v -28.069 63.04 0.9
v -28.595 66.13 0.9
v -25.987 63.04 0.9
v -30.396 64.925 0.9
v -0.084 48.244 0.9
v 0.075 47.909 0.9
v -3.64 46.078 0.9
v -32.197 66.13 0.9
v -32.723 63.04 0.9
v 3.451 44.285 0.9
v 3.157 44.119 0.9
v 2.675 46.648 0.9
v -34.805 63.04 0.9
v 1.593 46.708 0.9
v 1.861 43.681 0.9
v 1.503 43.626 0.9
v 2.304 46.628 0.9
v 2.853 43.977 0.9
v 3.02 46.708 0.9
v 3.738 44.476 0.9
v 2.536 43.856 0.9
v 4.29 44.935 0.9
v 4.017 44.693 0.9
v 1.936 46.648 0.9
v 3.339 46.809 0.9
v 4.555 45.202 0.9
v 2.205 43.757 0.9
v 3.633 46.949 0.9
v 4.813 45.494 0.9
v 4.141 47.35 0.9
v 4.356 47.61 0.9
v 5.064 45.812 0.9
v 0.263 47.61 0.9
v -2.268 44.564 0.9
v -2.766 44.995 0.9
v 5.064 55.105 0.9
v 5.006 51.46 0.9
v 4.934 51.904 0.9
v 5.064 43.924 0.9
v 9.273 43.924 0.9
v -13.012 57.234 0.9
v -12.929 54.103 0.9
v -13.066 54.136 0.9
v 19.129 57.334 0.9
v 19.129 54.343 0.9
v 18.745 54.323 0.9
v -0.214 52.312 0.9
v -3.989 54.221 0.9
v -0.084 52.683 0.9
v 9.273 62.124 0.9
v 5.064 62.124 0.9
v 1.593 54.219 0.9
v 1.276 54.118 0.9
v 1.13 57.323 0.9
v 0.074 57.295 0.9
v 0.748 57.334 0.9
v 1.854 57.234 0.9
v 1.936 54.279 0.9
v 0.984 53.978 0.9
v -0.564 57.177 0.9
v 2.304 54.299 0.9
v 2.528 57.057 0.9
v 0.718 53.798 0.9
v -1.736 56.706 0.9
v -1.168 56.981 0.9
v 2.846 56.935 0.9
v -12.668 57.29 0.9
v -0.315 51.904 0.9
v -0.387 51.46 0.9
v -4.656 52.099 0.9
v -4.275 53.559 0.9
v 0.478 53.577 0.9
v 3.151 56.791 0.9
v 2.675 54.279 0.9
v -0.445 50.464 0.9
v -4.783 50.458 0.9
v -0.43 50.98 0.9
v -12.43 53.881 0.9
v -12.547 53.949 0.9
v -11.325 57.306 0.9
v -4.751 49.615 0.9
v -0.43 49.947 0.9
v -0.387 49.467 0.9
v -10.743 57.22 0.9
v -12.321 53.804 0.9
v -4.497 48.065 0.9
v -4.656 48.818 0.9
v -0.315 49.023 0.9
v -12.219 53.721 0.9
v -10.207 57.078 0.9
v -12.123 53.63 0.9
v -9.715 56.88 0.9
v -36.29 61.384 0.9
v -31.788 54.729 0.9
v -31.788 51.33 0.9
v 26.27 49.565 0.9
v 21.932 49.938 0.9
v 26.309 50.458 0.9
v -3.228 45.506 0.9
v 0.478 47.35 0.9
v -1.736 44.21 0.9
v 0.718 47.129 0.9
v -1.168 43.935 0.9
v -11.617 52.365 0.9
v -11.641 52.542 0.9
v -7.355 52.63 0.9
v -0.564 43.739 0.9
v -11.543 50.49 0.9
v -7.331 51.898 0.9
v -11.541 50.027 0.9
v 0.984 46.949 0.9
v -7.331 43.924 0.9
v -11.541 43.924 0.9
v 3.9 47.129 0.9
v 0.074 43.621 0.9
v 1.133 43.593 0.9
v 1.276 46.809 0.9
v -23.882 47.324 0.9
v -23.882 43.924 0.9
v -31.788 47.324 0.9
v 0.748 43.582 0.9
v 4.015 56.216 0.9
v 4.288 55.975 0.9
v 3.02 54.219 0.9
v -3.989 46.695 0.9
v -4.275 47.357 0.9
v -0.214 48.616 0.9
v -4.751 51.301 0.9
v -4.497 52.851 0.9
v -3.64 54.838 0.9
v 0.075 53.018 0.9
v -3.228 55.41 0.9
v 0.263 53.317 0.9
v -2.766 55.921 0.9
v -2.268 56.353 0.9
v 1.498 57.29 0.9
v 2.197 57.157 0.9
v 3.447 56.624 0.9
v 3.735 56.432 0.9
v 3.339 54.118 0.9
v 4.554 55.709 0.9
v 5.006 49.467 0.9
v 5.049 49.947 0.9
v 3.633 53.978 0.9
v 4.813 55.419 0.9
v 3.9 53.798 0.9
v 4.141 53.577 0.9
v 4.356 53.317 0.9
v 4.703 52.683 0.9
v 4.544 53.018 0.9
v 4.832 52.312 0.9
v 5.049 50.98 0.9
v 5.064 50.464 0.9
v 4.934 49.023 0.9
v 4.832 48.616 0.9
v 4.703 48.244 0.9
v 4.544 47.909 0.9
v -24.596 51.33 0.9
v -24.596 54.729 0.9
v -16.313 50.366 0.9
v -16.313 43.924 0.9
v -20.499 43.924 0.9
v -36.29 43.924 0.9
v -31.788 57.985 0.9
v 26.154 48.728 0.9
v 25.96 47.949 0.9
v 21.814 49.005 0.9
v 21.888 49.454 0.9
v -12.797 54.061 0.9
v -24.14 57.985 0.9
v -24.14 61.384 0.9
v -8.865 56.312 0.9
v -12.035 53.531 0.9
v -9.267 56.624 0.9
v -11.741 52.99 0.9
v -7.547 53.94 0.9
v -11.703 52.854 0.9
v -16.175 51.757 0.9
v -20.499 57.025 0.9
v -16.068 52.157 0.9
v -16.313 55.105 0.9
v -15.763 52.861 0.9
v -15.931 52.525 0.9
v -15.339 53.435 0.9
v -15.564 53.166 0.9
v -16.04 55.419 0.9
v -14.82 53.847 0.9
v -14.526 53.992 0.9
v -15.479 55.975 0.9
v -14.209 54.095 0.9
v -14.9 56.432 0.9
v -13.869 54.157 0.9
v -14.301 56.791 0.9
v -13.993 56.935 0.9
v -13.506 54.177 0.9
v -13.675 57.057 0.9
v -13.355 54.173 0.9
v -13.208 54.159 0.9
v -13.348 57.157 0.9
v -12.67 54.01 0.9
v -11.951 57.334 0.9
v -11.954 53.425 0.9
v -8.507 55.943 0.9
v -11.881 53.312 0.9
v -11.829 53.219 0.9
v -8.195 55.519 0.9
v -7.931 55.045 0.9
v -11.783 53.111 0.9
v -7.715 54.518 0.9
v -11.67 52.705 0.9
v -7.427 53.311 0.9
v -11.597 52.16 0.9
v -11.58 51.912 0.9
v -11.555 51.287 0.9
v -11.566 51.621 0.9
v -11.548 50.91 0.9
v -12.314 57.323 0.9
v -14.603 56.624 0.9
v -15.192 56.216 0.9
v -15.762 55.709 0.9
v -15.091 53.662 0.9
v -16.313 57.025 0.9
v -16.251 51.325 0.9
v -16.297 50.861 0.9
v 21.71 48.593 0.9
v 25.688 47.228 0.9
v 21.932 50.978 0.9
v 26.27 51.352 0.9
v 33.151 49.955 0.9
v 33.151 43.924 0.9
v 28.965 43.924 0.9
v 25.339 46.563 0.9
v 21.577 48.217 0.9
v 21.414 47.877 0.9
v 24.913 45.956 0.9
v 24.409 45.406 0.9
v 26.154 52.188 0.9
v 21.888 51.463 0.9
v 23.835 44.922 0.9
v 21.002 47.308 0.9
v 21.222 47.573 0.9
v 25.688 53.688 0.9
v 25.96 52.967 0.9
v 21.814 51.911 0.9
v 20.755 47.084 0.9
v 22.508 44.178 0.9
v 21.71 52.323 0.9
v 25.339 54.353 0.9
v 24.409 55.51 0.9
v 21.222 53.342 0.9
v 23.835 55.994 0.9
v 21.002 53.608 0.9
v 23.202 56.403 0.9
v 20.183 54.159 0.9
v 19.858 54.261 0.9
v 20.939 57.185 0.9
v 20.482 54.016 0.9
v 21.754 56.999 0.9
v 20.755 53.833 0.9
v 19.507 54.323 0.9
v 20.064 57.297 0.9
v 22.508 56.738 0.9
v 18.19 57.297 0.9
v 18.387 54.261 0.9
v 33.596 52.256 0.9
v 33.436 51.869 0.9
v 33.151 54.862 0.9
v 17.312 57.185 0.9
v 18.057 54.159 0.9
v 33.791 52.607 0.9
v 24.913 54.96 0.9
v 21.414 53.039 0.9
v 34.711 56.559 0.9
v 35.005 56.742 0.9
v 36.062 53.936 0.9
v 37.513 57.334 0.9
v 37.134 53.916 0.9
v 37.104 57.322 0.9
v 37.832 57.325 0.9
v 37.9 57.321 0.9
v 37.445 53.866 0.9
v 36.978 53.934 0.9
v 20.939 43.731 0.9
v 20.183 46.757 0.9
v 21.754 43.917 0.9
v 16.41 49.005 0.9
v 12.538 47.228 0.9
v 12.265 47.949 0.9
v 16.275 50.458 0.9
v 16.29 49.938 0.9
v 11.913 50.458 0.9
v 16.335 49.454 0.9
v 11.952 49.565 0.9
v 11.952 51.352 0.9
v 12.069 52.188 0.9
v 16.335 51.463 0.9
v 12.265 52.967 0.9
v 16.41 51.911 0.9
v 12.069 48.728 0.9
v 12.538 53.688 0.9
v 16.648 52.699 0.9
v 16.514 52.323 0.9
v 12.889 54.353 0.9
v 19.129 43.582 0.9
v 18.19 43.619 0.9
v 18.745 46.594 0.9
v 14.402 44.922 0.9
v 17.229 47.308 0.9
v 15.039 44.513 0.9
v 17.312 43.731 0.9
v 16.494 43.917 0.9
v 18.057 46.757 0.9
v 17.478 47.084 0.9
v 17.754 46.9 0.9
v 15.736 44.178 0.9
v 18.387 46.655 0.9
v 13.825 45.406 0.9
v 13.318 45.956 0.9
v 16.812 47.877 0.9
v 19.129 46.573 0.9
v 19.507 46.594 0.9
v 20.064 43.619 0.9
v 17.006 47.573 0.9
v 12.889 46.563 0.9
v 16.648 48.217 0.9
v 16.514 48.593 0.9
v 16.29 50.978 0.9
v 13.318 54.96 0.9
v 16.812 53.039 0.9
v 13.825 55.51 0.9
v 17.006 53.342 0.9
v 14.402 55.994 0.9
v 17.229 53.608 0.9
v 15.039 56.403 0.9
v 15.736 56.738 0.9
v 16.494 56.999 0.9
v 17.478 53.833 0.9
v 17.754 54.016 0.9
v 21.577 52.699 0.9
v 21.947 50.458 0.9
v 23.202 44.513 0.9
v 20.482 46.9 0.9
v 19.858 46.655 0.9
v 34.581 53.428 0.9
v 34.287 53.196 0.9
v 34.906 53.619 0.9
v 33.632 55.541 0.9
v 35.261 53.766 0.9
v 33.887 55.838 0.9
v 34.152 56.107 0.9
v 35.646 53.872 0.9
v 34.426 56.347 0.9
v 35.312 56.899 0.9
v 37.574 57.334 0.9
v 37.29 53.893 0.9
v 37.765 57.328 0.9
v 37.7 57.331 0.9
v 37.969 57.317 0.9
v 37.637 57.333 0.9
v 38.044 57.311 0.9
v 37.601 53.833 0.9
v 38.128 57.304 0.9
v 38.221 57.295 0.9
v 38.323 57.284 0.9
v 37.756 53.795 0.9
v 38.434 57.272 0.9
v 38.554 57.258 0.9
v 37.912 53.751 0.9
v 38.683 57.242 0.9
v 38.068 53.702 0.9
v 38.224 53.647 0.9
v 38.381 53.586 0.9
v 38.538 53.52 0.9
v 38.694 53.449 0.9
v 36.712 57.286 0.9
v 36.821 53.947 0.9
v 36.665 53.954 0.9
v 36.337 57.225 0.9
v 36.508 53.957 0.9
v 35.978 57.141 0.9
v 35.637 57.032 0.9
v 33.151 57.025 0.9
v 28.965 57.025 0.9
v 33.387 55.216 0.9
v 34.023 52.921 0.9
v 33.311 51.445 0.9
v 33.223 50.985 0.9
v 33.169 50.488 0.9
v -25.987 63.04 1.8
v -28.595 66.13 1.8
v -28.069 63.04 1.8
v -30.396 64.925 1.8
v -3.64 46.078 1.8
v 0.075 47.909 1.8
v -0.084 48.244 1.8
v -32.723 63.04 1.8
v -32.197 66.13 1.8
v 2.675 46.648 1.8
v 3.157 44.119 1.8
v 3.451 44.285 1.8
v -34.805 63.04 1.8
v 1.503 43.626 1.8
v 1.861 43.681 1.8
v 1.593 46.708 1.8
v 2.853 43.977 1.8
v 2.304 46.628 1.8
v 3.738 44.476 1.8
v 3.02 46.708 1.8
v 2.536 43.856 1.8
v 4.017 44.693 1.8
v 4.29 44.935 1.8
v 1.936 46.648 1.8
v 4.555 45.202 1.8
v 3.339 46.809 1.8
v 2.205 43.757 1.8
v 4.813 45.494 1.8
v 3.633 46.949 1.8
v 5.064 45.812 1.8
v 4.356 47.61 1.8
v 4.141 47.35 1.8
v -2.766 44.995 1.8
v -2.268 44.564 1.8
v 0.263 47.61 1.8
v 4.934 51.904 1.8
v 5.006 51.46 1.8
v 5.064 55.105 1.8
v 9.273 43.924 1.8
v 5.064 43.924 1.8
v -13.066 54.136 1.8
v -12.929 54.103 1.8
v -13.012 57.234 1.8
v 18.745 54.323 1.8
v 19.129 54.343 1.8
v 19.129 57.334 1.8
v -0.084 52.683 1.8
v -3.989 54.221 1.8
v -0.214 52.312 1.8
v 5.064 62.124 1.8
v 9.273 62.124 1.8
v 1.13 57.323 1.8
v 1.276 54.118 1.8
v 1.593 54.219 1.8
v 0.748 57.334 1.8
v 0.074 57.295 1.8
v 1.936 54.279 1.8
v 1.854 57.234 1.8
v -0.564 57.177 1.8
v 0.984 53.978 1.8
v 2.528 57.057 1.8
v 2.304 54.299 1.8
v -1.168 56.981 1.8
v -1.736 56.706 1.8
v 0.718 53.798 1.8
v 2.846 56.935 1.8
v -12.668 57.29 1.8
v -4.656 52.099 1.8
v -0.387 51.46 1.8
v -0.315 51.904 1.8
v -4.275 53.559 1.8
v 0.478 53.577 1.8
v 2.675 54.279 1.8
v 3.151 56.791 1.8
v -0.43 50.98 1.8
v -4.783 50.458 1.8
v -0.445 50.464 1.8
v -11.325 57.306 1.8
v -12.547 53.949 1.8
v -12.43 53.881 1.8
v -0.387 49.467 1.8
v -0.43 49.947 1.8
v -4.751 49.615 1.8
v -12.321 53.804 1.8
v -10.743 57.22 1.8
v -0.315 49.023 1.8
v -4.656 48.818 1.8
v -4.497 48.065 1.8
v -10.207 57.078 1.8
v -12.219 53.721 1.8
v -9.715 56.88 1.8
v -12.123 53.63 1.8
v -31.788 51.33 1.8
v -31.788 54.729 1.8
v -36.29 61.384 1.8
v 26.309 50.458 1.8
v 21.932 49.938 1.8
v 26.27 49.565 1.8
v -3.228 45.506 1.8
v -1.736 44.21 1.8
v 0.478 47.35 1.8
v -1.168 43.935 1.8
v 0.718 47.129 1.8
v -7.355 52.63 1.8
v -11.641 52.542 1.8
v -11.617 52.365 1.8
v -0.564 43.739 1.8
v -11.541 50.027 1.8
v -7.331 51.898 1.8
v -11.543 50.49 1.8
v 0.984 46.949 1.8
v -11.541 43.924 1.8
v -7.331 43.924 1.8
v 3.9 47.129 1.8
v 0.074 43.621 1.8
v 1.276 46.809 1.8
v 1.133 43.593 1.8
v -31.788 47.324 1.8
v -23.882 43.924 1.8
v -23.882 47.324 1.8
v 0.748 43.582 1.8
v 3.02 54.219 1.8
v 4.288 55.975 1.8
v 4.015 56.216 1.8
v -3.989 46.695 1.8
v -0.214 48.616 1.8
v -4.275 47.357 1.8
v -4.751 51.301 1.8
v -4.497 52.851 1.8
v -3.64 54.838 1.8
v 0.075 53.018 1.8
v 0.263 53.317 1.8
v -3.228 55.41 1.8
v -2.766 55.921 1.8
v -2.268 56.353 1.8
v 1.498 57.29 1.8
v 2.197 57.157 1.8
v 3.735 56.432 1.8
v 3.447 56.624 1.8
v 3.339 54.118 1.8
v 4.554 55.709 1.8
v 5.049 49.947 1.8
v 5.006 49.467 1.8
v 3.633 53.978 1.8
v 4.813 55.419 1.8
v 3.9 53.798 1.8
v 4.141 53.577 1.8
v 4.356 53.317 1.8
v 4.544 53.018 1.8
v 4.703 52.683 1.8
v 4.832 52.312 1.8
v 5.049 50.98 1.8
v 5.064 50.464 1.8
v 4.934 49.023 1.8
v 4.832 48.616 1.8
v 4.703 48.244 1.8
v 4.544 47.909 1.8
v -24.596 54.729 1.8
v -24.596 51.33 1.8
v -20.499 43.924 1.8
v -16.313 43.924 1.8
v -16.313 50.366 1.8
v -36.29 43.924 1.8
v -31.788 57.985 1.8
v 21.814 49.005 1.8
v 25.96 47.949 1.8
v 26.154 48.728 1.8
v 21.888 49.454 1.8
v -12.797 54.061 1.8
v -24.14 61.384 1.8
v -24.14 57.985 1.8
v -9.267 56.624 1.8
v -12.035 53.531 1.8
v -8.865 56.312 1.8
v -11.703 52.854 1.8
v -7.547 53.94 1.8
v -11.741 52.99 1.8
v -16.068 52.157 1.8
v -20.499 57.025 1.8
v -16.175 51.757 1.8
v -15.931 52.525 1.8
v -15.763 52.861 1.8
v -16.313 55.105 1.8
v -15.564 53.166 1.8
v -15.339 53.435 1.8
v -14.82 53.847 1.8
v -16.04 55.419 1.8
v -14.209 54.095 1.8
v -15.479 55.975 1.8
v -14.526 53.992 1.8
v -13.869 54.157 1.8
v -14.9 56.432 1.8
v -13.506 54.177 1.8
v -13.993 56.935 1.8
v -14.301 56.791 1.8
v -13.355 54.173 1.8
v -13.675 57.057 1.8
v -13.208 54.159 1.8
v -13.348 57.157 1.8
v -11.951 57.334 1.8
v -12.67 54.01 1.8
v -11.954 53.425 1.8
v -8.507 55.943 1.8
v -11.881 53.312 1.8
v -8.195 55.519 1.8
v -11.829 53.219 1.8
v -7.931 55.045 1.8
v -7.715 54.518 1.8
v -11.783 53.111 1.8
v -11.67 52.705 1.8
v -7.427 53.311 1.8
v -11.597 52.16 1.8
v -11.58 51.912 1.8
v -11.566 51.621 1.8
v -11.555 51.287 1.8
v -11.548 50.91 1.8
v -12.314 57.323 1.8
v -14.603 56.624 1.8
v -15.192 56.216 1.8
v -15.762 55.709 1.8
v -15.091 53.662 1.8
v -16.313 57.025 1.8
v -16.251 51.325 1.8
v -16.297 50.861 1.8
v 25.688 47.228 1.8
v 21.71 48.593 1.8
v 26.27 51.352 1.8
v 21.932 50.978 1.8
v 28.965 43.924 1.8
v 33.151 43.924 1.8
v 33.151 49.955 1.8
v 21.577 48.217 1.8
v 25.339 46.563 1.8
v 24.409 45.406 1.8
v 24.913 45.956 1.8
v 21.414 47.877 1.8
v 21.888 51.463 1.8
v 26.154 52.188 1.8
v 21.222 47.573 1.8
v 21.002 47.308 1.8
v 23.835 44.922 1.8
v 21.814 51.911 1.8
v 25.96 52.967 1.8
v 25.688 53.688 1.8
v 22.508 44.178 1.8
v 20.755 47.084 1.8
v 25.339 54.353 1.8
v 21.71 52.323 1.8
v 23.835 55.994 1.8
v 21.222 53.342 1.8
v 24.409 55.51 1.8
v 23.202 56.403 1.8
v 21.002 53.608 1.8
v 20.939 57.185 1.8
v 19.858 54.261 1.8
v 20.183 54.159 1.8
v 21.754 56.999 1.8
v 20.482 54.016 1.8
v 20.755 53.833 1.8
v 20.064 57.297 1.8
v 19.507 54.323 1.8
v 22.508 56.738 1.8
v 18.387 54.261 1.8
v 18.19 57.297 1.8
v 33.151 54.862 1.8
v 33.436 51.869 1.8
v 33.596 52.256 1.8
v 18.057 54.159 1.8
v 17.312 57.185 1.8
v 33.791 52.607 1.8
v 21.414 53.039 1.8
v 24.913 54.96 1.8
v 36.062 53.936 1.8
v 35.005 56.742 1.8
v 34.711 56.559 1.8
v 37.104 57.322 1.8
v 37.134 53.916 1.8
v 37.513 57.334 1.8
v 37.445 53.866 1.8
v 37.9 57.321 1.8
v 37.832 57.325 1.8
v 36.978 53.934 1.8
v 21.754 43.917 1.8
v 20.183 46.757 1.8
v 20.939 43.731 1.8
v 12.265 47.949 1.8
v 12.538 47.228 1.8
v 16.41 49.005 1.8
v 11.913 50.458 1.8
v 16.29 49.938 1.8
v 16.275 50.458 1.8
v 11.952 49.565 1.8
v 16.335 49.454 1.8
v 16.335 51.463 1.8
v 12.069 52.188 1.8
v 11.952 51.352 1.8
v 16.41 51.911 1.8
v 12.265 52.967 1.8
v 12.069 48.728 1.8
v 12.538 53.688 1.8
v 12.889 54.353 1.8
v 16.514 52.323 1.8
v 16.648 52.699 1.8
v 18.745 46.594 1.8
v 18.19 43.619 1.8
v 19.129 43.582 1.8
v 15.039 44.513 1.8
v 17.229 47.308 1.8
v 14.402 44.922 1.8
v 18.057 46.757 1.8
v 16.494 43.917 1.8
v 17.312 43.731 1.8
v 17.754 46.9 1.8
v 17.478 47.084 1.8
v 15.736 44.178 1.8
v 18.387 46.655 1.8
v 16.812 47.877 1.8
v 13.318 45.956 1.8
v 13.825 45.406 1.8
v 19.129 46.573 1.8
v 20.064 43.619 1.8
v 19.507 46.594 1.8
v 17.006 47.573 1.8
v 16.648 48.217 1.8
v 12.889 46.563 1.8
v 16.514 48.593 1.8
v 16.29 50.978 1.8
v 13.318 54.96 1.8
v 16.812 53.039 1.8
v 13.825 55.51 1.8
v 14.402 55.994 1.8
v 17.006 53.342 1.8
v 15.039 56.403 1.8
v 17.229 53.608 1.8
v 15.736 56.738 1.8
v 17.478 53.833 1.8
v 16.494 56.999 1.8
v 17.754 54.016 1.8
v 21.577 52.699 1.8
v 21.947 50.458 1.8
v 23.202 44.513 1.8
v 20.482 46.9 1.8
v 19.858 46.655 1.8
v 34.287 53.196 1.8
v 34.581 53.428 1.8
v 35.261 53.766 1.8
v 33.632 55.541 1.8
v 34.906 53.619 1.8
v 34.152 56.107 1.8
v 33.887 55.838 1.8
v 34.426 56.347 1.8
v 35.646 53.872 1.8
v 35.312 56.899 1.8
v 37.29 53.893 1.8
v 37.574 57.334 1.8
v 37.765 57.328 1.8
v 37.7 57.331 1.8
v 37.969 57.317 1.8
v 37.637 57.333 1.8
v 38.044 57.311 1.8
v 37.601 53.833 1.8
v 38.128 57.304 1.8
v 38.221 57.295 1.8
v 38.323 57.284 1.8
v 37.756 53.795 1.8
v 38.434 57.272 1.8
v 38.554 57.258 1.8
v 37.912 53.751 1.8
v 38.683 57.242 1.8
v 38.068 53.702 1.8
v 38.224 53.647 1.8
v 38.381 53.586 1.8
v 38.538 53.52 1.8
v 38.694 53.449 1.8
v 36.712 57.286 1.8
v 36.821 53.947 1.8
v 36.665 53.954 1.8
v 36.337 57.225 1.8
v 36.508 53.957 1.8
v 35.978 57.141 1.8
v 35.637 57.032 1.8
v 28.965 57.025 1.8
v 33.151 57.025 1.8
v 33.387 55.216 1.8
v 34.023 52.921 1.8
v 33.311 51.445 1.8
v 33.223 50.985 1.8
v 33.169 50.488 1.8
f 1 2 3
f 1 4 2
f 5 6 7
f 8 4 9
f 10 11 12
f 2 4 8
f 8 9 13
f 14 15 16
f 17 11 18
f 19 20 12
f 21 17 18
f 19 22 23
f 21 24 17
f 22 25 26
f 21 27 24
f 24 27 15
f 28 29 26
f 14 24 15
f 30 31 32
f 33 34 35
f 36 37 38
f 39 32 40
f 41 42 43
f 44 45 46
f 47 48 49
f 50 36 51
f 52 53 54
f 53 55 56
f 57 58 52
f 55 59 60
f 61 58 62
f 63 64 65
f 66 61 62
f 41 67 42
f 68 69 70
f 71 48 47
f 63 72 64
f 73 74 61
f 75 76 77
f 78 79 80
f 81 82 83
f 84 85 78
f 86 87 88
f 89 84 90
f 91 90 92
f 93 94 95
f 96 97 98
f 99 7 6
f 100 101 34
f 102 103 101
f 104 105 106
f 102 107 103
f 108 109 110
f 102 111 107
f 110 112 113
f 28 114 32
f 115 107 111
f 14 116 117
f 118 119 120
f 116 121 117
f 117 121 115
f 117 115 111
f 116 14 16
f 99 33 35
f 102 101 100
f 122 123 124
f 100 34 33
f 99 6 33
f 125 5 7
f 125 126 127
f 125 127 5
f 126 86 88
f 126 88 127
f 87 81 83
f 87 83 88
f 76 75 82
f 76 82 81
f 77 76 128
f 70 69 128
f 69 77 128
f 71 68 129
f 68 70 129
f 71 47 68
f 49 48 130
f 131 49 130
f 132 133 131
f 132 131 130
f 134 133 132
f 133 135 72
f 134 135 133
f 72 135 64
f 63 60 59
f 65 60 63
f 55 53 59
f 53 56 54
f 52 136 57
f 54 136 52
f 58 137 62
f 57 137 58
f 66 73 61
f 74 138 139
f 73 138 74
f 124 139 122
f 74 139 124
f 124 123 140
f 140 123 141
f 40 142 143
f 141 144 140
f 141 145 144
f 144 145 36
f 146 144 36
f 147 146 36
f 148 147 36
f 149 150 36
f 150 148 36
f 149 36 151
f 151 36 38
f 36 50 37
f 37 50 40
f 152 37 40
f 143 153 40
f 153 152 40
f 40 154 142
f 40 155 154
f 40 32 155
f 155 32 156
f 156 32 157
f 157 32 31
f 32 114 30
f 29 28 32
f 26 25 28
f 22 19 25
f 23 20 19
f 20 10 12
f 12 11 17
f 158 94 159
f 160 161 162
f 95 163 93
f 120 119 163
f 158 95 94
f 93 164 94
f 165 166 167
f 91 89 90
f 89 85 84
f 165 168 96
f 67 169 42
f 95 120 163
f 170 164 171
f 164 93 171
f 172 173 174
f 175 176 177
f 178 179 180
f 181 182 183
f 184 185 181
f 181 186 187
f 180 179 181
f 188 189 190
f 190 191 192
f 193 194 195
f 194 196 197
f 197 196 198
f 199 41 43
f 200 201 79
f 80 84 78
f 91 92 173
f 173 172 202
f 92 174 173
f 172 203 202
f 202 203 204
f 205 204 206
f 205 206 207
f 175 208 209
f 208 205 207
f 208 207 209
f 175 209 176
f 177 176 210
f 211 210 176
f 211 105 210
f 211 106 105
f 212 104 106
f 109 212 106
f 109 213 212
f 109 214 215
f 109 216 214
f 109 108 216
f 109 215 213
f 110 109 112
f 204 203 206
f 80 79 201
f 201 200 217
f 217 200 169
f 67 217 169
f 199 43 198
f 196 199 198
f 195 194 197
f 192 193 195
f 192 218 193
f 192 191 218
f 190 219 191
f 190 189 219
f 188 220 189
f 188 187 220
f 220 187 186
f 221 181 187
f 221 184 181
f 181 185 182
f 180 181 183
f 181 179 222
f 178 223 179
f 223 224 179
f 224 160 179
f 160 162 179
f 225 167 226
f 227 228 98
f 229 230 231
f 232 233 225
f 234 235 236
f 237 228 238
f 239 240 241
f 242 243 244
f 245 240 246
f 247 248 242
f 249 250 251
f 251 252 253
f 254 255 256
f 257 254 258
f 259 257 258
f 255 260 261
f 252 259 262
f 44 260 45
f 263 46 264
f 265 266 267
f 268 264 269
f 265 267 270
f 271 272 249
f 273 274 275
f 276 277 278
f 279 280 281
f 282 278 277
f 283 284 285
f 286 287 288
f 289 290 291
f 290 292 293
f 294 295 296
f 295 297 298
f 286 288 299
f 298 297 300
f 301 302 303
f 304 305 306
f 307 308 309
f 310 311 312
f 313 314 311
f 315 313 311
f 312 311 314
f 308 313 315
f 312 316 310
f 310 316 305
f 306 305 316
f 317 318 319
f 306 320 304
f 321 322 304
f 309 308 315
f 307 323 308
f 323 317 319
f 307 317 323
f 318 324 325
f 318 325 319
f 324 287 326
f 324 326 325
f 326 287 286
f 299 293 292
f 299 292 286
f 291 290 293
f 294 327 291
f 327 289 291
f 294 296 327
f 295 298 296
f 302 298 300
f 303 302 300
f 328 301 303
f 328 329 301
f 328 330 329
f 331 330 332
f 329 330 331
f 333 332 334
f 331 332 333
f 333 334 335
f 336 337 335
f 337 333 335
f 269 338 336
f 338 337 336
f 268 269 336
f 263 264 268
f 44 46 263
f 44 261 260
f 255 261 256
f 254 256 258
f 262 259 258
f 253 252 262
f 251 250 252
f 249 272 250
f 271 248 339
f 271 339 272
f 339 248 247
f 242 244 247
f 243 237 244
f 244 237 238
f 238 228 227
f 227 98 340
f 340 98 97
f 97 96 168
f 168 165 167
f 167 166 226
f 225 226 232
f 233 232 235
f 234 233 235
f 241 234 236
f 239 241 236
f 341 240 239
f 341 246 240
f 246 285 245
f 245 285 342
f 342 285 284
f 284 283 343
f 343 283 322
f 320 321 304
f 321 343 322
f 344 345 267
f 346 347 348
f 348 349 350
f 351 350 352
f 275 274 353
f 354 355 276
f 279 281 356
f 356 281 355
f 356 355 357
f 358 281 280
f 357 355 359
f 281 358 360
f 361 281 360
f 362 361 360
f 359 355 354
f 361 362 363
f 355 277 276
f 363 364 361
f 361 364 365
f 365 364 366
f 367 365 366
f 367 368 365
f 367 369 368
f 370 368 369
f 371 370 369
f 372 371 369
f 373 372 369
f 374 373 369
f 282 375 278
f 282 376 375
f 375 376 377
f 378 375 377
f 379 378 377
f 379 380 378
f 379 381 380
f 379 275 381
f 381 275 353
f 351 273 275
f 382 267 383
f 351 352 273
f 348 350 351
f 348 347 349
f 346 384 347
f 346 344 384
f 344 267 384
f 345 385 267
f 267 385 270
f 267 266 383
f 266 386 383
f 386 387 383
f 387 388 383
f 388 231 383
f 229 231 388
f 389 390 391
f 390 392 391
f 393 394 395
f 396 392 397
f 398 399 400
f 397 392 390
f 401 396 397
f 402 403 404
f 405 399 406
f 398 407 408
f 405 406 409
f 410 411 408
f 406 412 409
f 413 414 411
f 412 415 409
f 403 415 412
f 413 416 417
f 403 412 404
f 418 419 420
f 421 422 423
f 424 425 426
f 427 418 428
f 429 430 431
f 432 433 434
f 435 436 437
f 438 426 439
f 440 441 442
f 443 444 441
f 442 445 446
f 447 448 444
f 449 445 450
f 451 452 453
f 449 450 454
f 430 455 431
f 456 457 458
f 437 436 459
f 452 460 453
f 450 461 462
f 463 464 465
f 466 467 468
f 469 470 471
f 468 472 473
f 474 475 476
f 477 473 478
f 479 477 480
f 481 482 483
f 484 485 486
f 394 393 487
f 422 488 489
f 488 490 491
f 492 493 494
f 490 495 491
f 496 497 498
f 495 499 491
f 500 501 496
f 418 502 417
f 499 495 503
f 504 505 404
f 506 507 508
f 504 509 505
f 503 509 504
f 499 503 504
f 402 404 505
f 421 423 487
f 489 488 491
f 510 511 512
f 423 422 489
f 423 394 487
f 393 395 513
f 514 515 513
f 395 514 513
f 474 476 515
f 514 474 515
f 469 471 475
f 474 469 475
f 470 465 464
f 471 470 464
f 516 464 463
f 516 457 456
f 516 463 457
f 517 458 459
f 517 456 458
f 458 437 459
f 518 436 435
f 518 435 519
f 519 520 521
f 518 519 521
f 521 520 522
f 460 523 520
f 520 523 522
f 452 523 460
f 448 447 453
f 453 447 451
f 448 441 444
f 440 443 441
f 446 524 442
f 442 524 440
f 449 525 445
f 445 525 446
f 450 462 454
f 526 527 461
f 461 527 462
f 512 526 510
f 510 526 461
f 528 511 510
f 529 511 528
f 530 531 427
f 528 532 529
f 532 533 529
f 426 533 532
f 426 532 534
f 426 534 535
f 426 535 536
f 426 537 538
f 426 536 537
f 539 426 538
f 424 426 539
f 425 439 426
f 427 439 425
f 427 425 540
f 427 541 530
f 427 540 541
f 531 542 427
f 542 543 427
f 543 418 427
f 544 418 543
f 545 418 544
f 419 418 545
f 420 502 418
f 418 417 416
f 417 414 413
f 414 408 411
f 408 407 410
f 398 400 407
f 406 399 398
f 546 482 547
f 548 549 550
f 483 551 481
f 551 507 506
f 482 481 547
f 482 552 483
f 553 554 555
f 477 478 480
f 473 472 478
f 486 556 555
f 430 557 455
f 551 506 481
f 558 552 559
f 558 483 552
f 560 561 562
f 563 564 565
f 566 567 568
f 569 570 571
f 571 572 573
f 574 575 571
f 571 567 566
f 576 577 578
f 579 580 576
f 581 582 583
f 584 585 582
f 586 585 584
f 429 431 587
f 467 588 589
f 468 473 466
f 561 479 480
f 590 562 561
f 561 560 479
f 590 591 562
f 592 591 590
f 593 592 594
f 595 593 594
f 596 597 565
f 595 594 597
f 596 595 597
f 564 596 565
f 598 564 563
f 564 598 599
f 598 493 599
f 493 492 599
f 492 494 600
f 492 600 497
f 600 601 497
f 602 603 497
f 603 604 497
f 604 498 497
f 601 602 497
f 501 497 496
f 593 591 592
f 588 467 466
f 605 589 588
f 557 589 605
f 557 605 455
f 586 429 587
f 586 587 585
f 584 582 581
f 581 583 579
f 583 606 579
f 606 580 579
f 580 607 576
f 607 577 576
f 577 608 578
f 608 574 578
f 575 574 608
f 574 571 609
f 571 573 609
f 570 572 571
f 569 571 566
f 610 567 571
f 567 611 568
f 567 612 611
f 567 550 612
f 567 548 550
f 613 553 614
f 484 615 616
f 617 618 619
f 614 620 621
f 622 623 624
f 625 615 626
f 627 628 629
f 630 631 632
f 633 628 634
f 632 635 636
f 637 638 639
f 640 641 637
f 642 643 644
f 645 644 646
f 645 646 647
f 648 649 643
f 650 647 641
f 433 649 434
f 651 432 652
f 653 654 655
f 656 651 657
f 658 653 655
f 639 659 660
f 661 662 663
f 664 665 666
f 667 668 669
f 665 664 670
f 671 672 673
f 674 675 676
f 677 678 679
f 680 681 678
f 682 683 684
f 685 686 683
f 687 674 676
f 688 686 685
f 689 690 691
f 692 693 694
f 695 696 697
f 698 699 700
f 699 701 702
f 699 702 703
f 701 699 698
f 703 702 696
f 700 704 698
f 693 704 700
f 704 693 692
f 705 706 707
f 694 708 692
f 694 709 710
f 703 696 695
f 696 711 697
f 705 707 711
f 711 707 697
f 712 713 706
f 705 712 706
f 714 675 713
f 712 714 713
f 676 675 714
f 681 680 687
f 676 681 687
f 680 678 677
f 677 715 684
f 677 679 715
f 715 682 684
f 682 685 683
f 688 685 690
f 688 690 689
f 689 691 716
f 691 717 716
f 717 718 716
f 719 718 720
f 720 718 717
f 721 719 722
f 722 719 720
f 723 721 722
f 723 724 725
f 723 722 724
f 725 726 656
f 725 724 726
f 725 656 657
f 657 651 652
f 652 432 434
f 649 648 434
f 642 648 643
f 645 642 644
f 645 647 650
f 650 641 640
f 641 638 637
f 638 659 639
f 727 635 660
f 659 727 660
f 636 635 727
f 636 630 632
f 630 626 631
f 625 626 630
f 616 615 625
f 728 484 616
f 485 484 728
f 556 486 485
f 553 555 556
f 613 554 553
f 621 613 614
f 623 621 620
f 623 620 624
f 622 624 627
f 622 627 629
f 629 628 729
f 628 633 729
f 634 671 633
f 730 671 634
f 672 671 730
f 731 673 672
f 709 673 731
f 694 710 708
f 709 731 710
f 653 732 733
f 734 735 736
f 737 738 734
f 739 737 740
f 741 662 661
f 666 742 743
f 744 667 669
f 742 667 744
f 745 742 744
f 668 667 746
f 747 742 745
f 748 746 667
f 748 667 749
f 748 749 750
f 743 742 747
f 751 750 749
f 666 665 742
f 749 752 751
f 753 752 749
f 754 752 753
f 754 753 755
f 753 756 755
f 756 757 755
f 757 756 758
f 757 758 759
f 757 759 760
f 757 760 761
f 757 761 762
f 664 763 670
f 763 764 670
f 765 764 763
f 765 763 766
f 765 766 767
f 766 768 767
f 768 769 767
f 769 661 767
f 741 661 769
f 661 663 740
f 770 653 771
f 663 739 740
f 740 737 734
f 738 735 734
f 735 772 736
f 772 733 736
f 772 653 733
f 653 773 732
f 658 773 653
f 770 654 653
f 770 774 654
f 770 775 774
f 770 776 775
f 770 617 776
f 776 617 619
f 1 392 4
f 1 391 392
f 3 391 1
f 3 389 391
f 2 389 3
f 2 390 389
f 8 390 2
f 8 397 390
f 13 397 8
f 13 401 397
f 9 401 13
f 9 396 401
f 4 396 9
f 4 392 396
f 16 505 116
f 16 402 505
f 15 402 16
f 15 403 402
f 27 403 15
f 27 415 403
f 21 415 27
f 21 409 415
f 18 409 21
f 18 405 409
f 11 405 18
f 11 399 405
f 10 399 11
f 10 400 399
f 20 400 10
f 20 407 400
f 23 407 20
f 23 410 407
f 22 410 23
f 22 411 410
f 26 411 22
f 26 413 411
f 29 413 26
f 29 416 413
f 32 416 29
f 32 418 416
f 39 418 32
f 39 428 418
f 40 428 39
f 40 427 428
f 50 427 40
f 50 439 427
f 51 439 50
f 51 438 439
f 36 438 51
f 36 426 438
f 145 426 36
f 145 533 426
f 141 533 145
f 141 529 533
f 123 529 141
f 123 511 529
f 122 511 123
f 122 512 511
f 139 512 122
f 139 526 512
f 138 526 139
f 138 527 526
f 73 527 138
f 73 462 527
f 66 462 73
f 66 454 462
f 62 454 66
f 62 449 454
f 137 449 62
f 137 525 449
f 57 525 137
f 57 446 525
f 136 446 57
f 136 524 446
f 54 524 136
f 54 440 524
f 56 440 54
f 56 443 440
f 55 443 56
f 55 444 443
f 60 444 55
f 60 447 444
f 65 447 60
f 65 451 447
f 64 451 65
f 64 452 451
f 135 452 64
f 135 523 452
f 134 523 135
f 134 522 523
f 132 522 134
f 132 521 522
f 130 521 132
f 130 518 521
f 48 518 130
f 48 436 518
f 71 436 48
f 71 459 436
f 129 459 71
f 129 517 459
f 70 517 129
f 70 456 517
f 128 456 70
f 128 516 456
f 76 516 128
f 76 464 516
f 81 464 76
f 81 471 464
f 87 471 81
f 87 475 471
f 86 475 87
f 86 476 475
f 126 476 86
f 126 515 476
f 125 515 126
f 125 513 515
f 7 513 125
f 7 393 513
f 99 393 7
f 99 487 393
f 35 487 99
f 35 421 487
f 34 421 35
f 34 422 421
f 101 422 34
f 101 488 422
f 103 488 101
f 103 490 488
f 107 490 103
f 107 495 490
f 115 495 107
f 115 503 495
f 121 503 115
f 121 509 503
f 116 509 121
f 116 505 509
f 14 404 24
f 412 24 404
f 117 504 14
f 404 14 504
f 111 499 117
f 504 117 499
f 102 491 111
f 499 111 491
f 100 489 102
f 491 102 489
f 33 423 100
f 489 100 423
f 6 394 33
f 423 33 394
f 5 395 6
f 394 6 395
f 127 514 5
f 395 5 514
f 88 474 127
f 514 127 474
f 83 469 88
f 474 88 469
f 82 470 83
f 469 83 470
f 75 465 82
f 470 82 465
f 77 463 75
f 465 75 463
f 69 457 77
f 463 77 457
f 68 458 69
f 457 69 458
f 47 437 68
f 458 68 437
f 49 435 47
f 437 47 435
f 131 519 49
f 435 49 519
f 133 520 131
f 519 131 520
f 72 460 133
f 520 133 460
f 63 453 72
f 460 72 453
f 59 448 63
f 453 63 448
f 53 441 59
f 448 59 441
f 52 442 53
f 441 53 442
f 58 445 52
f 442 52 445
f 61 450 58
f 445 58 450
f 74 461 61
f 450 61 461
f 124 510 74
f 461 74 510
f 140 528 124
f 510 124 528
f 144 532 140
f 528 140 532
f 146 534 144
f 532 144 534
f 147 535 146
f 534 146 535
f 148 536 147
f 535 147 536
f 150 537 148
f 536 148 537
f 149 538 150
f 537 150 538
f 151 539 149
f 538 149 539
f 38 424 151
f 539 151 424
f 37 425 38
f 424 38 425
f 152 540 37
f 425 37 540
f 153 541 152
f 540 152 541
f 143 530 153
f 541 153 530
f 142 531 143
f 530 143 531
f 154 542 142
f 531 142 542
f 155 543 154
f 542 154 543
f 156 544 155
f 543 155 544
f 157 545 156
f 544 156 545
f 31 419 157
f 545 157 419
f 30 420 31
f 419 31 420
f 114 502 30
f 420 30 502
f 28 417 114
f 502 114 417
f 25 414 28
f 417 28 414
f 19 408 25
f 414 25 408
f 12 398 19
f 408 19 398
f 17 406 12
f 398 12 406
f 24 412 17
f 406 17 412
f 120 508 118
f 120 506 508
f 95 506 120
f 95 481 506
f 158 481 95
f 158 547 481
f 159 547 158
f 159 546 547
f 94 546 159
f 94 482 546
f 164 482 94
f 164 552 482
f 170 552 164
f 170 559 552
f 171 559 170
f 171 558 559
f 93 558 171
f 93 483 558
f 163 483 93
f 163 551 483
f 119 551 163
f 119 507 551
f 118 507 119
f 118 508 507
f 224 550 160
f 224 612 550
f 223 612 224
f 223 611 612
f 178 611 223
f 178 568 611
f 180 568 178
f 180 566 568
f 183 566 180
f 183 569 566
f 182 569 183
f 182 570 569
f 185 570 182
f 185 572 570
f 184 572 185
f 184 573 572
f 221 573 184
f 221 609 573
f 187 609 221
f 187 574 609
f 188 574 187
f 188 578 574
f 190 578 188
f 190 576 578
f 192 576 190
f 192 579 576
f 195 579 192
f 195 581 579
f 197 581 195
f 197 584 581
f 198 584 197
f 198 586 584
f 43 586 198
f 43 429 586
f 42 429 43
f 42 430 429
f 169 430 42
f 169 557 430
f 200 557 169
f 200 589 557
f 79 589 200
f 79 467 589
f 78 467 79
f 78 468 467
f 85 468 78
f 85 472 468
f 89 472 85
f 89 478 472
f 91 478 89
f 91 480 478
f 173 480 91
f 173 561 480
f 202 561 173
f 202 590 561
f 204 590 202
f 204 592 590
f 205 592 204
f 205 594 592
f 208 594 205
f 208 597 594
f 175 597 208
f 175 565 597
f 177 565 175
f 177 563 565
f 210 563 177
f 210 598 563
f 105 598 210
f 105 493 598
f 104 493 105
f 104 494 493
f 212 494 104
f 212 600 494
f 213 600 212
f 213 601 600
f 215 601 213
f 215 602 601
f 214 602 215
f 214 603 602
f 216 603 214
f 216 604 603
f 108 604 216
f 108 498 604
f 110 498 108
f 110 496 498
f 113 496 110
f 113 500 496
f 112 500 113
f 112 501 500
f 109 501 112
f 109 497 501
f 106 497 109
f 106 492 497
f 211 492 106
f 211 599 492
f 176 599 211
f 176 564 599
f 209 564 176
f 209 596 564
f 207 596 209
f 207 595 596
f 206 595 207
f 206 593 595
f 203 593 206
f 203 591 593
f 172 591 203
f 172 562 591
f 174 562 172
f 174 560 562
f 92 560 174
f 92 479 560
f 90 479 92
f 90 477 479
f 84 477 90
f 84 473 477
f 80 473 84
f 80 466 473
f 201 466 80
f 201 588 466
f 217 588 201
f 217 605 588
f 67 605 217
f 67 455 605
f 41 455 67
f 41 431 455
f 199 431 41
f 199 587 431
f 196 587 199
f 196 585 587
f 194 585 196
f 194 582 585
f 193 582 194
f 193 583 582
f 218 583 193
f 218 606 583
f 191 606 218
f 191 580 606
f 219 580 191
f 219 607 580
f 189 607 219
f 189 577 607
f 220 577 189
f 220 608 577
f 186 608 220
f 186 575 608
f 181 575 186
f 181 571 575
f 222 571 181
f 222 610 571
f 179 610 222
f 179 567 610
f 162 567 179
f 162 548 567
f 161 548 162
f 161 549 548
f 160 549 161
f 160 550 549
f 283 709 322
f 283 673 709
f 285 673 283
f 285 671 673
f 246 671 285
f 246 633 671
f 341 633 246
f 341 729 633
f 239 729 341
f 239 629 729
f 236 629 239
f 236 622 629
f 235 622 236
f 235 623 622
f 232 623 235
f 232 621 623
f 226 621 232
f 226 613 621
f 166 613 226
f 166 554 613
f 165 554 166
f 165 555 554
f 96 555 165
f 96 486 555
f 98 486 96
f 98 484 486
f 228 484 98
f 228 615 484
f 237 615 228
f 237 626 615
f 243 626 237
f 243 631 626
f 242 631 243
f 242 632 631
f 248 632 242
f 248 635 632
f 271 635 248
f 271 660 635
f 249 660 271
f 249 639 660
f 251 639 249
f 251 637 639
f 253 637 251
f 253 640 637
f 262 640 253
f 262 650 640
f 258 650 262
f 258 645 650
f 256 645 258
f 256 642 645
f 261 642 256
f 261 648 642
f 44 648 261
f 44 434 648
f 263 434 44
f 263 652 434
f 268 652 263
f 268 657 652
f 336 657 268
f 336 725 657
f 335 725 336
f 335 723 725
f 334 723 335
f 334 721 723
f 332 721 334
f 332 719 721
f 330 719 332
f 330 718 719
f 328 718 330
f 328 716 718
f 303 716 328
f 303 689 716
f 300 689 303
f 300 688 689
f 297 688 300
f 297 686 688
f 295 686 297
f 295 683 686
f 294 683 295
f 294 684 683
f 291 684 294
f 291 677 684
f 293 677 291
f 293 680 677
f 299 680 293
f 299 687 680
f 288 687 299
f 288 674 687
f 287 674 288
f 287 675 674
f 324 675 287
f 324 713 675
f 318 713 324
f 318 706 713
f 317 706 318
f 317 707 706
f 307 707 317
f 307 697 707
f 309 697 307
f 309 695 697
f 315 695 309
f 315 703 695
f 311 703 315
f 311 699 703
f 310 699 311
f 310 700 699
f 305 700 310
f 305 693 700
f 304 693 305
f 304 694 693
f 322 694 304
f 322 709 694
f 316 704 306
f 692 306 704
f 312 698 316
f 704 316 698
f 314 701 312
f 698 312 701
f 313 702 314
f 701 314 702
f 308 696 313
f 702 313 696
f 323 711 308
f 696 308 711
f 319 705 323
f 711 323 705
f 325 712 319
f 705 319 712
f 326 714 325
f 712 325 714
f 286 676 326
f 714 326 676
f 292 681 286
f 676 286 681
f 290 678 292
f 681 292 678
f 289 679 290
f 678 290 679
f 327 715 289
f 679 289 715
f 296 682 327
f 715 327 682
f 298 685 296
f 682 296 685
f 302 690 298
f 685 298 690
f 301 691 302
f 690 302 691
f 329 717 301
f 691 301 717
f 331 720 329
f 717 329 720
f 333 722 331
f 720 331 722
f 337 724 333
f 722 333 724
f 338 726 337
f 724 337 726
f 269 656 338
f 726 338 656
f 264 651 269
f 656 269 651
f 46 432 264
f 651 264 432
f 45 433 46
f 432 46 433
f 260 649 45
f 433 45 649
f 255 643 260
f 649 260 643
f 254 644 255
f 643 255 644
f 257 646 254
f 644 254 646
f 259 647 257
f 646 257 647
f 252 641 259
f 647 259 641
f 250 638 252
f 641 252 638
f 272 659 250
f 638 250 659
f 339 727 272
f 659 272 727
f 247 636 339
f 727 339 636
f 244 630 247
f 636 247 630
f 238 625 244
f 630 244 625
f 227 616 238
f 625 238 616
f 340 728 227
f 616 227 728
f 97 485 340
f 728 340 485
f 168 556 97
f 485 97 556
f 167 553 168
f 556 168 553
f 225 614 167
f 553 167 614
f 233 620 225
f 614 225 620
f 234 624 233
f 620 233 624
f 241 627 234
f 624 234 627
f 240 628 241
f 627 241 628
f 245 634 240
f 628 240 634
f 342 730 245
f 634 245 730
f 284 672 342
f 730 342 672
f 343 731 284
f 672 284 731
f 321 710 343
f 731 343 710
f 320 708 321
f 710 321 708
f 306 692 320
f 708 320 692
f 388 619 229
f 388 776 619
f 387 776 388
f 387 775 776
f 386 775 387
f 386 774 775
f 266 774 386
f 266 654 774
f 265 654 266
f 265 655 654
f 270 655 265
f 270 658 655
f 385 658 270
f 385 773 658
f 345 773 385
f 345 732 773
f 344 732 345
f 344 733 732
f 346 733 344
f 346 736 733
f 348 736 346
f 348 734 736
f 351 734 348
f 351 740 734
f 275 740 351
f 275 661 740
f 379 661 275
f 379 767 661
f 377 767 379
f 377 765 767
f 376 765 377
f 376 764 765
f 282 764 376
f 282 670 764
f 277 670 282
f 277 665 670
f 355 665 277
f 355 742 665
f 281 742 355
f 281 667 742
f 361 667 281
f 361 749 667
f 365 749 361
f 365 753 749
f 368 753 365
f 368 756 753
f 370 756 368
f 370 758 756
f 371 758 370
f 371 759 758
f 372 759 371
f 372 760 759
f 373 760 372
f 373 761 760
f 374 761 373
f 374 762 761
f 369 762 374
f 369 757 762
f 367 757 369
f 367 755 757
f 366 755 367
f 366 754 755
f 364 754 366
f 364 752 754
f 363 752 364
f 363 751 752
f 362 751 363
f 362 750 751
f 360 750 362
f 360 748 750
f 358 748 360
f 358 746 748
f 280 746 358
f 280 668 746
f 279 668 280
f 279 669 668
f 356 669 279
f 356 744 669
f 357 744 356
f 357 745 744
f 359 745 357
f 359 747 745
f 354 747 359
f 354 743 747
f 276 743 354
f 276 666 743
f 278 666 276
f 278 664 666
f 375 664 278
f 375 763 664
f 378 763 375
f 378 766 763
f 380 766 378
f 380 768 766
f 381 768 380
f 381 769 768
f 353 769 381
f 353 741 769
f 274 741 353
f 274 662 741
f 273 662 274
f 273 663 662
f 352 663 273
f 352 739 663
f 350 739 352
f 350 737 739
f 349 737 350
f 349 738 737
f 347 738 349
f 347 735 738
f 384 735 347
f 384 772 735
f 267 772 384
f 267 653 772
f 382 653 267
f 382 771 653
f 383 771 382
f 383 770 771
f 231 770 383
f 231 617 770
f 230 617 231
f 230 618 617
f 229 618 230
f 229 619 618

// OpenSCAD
$fn = 48;
  // transliteration (above top hole)
  translate([0, 54.600, 0.900]) linear_extrude(height=0.900) text("Êndor", size=17.245, halign="center", valign="center", font="Helvetica Neue:style=Bold");
